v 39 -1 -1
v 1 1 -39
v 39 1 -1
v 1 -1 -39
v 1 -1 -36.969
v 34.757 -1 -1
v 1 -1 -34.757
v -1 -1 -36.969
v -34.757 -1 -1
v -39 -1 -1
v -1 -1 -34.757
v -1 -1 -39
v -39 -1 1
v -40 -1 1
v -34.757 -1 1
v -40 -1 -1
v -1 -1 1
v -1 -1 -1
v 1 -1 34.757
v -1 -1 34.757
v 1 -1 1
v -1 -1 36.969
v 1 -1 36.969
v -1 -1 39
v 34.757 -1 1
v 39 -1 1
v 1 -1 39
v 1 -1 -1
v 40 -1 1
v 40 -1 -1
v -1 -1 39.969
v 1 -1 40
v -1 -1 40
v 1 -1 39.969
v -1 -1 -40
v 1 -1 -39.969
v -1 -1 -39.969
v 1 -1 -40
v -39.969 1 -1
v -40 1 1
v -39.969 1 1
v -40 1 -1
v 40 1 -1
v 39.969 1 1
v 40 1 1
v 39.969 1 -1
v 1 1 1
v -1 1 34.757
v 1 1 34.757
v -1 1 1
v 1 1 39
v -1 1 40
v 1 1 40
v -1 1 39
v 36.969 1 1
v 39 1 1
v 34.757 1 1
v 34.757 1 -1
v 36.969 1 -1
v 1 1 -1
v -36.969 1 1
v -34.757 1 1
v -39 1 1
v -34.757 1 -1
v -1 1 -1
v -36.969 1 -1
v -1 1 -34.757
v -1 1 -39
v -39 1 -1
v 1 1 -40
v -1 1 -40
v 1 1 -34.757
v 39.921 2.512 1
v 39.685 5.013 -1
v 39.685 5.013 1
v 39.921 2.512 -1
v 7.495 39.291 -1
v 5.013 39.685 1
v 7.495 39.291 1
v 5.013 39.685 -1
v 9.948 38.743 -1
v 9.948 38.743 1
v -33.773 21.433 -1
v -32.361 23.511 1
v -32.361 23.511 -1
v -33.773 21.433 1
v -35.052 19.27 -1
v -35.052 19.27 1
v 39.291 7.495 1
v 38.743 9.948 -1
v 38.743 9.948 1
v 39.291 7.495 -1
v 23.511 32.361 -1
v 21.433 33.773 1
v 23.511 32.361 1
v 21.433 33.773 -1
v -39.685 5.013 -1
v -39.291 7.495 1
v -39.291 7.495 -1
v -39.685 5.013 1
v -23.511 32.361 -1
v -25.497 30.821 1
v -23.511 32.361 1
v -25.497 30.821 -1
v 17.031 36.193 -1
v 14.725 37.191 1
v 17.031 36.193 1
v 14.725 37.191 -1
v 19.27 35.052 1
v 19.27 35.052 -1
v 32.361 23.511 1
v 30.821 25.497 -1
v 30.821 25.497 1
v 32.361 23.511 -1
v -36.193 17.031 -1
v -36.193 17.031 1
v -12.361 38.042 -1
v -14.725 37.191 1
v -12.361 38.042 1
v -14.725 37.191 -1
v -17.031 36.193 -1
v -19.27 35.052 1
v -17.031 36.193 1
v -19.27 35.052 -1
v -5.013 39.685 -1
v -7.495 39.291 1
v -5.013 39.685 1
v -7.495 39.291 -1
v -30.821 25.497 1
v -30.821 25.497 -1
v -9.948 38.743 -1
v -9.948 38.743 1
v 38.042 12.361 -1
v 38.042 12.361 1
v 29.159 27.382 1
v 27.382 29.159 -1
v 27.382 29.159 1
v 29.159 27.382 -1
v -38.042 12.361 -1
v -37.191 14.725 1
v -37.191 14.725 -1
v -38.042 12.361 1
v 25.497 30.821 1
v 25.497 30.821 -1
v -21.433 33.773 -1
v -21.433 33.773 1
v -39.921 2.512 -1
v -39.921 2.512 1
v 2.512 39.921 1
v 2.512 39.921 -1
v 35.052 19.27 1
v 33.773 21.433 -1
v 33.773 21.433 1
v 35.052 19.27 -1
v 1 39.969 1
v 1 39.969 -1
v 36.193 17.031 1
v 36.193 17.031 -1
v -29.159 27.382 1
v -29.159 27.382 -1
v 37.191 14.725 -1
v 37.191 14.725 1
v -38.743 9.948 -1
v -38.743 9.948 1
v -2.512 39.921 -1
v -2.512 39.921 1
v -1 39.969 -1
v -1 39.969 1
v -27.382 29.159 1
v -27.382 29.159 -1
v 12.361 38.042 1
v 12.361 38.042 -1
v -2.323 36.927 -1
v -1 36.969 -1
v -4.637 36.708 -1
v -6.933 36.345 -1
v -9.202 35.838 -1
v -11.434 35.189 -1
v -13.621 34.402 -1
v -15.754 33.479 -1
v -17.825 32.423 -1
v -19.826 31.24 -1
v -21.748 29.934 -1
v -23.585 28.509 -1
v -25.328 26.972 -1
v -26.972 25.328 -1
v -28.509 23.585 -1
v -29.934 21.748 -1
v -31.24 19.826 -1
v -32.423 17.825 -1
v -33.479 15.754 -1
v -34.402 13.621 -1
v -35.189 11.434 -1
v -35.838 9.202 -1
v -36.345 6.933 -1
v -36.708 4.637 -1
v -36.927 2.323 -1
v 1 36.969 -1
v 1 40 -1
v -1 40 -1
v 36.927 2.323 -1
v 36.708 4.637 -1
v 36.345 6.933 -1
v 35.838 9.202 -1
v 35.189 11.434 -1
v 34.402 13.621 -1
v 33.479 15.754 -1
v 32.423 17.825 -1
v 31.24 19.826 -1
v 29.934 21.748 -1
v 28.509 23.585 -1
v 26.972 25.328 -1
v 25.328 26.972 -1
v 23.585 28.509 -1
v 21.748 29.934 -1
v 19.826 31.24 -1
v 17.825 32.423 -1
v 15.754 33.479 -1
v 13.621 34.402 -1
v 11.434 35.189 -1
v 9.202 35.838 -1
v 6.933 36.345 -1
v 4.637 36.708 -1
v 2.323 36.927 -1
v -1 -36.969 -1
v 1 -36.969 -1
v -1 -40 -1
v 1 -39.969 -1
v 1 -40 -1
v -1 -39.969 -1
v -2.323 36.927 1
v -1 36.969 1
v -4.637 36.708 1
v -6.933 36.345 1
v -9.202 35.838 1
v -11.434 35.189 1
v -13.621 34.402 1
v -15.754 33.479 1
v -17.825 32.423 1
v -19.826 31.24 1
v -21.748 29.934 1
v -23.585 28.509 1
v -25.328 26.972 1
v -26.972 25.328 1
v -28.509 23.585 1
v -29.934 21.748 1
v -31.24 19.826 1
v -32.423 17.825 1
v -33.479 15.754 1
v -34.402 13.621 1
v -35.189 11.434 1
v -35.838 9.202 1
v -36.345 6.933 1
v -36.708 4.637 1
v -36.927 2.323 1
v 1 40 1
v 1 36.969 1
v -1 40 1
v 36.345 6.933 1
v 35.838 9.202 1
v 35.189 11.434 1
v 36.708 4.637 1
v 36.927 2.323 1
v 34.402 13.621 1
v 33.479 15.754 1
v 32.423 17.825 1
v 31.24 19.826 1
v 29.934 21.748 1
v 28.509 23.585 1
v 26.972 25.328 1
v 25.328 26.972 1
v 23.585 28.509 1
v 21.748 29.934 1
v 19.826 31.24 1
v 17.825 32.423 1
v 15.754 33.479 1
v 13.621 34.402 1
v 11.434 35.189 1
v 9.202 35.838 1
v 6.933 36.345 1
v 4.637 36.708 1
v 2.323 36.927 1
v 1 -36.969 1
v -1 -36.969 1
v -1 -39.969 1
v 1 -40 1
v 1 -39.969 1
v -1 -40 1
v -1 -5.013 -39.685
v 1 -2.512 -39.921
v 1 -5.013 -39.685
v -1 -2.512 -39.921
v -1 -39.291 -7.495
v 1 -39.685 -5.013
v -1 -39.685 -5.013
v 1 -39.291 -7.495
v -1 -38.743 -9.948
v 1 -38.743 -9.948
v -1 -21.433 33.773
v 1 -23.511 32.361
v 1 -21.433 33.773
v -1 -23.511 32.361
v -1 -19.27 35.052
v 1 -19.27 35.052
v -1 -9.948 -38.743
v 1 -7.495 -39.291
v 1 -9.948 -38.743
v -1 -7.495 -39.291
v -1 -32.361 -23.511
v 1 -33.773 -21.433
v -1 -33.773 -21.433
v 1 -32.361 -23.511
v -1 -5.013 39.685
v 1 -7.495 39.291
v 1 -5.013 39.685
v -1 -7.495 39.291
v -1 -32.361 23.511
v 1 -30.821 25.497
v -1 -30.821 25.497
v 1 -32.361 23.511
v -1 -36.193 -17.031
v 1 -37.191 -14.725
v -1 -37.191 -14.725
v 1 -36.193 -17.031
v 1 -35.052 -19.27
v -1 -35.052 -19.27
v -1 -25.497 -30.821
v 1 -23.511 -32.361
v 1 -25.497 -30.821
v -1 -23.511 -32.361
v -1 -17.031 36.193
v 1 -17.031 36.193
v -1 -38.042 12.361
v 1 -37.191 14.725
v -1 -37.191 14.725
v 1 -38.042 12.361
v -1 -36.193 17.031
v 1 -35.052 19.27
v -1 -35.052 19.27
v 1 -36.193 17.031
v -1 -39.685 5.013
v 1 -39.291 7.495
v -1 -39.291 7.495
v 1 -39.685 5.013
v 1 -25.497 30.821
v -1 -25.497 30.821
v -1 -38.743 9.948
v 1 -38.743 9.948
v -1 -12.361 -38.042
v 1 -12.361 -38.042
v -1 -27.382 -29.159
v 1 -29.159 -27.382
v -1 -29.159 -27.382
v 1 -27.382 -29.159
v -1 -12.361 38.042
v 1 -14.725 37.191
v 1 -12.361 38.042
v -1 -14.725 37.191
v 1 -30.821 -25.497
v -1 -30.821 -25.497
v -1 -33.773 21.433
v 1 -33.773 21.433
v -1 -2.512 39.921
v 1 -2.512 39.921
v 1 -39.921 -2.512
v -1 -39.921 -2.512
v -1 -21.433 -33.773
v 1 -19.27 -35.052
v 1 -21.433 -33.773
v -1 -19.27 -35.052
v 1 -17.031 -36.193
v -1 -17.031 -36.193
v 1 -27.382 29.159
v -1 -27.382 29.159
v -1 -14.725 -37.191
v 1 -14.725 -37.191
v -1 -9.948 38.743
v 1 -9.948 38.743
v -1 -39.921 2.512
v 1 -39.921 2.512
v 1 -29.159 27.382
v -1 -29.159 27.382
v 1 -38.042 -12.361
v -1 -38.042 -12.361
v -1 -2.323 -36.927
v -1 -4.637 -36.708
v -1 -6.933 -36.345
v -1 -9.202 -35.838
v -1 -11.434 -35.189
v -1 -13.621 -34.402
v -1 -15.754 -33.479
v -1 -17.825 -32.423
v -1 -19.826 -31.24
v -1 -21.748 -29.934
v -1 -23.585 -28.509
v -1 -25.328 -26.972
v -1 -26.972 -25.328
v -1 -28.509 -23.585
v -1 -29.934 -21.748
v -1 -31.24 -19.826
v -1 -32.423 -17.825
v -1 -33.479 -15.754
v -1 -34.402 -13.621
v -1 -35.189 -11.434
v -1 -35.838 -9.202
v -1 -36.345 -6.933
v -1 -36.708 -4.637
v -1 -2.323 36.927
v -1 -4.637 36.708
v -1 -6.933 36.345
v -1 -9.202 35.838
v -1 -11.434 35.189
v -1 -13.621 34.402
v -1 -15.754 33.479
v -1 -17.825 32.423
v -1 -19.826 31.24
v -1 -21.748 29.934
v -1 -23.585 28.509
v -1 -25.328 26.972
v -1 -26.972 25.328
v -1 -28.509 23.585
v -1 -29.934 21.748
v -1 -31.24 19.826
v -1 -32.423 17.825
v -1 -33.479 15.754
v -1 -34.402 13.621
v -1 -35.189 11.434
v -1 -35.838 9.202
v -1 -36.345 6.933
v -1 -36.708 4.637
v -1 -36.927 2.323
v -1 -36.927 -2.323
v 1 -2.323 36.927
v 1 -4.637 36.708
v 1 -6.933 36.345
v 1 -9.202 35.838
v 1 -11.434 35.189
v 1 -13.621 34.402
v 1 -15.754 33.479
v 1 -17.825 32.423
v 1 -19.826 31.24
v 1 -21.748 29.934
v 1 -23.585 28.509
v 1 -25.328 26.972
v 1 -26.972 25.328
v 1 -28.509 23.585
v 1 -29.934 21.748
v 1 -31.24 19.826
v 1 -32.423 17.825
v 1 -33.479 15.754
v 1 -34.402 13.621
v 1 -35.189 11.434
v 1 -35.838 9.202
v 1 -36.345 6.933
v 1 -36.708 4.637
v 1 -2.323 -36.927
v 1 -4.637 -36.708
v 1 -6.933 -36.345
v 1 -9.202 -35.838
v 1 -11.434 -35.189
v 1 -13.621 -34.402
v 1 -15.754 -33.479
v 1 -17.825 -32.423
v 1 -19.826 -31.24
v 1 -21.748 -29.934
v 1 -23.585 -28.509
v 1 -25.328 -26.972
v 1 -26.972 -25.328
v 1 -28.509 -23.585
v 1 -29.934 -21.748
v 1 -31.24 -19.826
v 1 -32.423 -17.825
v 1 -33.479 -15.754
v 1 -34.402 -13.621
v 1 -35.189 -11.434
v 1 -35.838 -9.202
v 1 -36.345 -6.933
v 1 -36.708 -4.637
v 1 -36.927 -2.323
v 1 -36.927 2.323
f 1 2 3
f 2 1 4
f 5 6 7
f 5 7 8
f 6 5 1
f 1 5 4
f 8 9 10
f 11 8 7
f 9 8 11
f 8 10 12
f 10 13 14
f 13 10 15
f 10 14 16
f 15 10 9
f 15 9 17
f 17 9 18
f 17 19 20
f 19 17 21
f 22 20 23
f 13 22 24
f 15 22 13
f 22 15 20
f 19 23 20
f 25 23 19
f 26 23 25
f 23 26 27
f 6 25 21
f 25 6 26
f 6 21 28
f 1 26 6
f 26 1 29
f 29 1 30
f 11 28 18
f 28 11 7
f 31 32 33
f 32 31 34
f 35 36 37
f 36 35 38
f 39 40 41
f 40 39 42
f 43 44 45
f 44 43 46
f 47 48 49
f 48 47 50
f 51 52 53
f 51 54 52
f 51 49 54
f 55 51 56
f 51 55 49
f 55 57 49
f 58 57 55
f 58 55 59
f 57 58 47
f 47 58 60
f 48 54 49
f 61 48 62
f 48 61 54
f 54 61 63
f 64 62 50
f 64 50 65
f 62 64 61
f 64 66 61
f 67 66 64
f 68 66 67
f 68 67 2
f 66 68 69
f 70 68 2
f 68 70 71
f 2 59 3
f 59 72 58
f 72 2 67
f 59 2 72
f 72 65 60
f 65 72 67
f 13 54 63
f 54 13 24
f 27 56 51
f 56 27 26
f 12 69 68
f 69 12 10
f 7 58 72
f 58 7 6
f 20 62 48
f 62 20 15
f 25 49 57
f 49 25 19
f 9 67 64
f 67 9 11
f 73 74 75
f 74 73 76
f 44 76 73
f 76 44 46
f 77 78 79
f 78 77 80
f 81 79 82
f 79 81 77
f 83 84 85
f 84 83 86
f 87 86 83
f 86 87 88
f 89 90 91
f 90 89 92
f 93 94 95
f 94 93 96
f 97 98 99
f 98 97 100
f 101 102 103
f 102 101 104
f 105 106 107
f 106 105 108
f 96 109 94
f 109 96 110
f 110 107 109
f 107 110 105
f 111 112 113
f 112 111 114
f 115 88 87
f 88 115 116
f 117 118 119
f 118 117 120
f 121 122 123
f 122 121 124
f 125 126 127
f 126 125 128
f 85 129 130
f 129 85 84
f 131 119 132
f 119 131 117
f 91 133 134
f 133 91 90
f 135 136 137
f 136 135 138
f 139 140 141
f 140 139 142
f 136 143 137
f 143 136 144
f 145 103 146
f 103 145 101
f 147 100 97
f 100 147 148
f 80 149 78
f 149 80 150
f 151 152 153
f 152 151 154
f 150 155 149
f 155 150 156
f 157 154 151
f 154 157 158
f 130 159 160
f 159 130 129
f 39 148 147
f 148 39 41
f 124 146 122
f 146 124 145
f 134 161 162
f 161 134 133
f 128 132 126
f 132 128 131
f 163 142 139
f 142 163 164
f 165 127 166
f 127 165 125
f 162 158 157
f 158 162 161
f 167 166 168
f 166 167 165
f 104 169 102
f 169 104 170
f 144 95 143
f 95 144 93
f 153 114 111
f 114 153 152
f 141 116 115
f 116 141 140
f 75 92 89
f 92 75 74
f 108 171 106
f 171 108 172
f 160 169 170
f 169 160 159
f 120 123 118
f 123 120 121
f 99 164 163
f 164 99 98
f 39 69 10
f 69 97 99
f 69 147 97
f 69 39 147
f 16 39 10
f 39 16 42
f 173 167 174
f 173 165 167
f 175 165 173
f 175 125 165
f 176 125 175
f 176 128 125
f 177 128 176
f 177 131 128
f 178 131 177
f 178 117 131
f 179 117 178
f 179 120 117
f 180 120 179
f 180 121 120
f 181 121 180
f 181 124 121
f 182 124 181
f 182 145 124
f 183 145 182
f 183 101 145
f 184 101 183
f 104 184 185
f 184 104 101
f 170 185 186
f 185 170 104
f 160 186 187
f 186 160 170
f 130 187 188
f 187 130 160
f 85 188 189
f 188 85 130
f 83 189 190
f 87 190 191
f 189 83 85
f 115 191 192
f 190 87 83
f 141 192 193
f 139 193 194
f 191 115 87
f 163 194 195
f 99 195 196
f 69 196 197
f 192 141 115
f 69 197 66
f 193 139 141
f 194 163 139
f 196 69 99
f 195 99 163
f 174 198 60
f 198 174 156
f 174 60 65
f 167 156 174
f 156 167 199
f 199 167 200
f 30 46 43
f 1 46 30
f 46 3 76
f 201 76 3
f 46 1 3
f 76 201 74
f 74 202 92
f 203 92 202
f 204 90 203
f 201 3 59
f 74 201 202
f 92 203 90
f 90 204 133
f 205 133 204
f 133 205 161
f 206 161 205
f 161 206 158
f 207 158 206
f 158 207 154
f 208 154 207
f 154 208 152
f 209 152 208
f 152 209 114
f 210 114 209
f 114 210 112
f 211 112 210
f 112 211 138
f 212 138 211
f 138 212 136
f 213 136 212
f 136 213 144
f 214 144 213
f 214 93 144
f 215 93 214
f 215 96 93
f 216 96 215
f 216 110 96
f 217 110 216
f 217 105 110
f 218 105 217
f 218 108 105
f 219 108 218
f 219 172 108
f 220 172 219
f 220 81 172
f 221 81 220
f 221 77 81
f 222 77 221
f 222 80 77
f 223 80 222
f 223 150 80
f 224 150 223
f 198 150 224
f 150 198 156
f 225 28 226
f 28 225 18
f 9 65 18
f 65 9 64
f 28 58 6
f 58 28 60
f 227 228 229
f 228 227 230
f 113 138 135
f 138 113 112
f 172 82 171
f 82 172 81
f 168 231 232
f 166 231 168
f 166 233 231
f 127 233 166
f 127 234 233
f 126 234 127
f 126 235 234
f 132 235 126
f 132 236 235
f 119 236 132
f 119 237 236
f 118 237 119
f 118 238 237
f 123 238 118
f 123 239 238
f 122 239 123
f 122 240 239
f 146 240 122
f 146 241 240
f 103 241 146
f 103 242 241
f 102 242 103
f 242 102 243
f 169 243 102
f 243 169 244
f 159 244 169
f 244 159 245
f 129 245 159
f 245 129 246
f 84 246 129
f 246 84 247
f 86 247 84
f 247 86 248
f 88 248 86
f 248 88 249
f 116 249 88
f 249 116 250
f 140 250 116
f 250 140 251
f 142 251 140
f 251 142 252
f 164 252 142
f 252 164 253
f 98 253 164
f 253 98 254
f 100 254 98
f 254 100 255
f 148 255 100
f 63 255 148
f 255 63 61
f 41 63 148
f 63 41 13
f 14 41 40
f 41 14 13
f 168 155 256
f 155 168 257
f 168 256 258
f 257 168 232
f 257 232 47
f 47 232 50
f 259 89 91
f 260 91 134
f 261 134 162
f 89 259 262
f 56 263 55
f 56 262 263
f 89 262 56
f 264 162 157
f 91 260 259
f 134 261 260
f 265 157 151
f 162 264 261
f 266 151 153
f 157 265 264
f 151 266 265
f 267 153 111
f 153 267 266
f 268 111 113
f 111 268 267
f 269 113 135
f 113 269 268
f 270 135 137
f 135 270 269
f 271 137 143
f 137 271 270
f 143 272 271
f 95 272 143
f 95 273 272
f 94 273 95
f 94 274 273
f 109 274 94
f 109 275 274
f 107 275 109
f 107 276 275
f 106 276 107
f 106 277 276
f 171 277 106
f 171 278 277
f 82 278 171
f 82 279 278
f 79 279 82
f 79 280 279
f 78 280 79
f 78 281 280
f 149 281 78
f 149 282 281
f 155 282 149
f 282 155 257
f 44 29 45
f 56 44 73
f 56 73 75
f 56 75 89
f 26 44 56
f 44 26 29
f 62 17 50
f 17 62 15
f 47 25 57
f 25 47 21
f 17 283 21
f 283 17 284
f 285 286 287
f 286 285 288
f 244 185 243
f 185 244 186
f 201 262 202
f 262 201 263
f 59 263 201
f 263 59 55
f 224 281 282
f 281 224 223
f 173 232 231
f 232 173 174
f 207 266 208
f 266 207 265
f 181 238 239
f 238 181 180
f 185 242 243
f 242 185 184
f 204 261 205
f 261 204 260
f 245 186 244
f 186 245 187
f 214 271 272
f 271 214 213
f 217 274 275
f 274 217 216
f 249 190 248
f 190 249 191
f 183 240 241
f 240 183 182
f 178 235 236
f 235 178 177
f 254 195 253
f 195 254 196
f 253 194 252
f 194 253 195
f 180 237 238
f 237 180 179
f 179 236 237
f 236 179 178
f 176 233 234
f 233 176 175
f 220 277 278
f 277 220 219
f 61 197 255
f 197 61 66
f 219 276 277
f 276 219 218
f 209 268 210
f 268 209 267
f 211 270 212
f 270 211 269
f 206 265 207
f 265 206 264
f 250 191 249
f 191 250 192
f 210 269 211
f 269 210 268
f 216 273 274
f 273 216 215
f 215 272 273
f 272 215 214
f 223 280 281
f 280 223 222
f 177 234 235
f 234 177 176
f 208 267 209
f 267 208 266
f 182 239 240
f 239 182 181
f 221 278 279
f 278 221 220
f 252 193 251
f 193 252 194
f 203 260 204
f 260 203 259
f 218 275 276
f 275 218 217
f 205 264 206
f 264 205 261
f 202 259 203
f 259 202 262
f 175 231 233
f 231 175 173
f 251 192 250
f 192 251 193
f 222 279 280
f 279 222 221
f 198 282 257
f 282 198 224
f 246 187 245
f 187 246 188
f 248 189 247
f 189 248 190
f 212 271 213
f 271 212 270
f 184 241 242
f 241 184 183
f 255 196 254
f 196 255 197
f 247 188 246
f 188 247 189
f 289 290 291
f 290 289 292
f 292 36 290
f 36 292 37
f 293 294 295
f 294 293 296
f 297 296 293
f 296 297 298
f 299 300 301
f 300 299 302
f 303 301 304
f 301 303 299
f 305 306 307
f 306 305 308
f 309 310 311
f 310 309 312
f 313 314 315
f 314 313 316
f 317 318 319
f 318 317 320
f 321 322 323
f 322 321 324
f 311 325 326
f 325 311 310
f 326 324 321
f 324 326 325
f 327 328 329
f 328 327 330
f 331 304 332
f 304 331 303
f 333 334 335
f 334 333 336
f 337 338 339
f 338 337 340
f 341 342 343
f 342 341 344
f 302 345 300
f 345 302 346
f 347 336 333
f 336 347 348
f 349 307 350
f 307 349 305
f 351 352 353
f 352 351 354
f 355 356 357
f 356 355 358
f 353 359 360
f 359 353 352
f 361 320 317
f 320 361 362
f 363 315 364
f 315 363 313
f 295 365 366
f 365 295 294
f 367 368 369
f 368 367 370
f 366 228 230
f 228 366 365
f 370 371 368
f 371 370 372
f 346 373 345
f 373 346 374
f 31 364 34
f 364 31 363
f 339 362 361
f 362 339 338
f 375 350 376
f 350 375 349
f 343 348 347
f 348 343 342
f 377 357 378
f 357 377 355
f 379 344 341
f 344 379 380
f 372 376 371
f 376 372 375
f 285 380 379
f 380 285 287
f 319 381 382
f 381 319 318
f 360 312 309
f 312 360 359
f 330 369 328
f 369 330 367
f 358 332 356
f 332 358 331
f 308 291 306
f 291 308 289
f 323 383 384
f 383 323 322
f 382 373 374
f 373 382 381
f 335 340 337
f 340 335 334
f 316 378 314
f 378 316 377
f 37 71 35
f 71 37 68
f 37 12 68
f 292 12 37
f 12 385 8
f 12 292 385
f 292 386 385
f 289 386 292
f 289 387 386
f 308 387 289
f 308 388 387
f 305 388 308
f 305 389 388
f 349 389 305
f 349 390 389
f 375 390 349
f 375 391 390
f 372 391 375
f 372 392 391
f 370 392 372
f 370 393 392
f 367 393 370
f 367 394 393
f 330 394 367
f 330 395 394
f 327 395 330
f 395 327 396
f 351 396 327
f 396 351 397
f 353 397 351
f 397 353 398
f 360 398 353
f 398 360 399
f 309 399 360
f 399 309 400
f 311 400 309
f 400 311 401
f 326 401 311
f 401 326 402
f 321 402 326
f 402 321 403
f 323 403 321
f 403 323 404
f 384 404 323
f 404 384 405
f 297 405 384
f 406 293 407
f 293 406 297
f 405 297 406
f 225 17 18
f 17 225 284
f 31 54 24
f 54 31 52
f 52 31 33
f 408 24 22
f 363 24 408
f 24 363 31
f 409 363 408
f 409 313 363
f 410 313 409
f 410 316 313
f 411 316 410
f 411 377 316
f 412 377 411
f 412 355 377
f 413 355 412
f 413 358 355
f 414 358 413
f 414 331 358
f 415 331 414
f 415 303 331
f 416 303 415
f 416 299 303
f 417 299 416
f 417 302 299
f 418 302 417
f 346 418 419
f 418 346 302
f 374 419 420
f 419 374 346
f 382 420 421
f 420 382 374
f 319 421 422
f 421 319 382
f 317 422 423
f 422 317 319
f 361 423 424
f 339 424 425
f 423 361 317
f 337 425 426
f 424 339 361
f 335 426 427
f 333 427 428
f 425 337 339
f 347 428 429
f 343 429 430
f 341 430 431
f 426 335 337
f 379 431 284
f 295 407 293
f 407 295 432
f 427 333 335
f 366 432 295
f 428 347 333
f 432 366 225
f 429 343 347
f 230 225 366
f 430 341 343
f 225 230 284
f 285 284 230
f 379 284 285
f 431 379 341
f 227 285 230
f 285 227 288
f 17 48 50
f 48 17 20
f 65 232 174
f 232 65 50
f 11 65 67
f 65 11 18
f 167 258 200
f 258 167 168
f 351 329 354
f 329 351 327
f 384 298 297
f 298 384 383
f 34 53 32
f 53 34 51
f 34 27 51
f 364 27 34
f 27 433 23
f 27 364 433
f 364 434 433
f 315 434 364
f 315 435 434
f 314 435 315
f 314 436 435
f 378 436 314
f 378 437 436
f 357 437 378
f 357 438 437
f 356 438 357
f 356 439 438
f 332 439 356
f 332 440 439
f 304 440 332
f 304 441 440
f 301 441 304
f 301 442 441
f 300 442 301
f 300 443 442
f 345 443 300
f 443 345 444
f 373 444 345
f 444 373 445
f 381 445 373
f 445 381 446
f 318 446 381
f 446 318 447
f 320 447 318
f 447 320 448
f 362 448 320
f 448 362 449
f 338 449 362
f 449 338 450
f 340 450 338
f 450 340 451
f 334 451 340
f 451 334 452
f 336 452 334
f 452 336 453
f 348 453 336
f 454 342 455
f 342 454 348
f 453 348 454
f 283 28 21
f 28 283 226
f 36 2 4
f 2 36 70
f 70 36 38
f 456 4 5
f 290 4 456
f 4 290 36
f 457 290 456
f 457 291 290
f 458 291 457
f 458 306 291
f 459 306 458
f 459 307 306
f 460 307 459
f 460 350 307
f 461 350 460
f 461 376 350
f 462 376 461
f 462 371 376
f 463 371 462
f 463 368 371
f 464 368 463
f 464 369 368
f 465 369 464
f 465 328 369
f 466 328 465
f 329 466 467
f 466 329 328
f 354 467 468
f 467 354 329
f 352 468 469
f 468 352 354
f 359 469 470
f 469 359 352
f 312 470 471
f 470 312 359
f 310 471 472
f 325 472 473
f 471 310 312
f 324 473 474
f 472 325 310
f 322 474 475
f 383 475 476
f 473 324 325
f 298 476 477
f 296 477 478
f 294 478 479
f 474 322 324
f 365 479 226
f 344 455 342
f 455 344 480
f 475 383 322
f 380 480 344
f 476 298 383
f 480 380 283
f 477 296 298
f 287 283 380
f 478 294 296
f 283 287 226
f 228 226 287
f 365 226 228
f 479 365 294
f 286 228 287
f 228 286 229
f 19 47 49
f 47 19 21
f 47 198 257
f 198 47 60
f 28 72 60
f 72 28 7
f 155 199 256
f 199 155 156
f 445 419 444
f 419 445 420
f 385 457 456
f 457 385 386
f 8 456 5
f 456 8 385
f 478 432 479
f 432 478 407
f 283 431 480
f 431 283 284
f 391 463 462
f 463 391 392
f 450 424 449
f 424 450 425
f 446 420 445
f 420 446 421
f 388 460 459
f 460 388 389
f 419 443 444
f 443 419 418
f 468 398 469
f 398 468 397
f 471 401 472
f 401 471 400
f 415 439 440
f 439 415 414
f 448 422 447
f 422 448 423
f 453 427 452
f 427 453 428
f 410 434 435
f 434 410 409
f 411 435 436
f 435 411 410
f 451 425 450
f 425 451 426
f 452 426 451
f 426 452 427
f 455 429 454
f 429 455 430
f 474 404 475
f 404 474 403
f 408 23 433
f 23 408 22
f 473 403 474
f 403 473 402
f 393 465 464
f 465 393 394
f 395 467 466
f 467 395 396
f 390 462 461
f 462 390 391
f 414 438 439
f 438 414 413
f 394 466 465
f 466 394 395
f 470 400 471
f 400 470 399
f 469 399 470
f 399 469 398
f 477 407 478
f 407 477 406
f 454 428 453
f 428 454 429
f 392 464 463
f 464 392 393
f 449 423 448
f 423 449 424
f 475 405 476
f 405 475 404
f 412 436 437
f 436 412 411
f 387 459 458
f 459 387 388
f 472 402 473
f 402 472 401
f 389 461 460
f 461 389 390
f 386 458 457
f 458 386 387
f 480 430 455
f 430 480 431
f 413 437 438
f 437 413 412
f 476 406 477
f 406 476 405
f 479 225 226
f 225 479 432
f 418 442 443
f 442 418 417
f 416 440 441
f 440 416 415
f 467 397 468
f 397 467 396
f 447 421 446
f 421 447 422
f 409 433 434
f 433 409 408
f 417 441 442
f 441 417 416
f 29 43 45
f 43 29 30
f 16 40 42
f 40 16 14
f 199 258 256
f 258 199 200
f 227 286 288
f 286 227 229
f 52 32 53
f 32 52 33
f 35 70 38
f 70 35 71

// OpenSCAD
frameThickness = 2;
frameWidth = 3;
frameDiameter = 80;
squareSide=frameDiameter/sqrt(2);
circleRadius = frameDiameter / 2;
finese = 100;

module CylindricalHalfShell(rout,rin,h) {
    intersection() {
        difference() {
            cylinder(r=rout,h=h,center=true);
            cylinder(r=rin,h=h,center=true);
        }
        translate([-rout,0,-h/2]) cube([2*rout,rout,h]);
    }
}

rotate([90,45,0]) difference() {
    cube([squareSide, squareSide, frameThickness], center=true);
    cube([squareSide - 2 * frameWidth, squareSide - 2 * frameWidth, frameThickness], center=true);
}

CylindricalHalfShell(circleRadius, circleRadius - frameWidth, frameThickness, $fn=finese);

mirror([0,1,0]) rotate(a=90,v=[0,1,0]) CylindricalHalfShell(circleRadius, circleRadius - frameWidth, frameThickness, $fn=finese);

cube([frameDiameter,frameThickness,frameThickness],center=true);
cube([frameThickness,frameDiameter,frameThickness],center=true);
cube([frameThickness,frameThickness,frameDiameter],center=true);
